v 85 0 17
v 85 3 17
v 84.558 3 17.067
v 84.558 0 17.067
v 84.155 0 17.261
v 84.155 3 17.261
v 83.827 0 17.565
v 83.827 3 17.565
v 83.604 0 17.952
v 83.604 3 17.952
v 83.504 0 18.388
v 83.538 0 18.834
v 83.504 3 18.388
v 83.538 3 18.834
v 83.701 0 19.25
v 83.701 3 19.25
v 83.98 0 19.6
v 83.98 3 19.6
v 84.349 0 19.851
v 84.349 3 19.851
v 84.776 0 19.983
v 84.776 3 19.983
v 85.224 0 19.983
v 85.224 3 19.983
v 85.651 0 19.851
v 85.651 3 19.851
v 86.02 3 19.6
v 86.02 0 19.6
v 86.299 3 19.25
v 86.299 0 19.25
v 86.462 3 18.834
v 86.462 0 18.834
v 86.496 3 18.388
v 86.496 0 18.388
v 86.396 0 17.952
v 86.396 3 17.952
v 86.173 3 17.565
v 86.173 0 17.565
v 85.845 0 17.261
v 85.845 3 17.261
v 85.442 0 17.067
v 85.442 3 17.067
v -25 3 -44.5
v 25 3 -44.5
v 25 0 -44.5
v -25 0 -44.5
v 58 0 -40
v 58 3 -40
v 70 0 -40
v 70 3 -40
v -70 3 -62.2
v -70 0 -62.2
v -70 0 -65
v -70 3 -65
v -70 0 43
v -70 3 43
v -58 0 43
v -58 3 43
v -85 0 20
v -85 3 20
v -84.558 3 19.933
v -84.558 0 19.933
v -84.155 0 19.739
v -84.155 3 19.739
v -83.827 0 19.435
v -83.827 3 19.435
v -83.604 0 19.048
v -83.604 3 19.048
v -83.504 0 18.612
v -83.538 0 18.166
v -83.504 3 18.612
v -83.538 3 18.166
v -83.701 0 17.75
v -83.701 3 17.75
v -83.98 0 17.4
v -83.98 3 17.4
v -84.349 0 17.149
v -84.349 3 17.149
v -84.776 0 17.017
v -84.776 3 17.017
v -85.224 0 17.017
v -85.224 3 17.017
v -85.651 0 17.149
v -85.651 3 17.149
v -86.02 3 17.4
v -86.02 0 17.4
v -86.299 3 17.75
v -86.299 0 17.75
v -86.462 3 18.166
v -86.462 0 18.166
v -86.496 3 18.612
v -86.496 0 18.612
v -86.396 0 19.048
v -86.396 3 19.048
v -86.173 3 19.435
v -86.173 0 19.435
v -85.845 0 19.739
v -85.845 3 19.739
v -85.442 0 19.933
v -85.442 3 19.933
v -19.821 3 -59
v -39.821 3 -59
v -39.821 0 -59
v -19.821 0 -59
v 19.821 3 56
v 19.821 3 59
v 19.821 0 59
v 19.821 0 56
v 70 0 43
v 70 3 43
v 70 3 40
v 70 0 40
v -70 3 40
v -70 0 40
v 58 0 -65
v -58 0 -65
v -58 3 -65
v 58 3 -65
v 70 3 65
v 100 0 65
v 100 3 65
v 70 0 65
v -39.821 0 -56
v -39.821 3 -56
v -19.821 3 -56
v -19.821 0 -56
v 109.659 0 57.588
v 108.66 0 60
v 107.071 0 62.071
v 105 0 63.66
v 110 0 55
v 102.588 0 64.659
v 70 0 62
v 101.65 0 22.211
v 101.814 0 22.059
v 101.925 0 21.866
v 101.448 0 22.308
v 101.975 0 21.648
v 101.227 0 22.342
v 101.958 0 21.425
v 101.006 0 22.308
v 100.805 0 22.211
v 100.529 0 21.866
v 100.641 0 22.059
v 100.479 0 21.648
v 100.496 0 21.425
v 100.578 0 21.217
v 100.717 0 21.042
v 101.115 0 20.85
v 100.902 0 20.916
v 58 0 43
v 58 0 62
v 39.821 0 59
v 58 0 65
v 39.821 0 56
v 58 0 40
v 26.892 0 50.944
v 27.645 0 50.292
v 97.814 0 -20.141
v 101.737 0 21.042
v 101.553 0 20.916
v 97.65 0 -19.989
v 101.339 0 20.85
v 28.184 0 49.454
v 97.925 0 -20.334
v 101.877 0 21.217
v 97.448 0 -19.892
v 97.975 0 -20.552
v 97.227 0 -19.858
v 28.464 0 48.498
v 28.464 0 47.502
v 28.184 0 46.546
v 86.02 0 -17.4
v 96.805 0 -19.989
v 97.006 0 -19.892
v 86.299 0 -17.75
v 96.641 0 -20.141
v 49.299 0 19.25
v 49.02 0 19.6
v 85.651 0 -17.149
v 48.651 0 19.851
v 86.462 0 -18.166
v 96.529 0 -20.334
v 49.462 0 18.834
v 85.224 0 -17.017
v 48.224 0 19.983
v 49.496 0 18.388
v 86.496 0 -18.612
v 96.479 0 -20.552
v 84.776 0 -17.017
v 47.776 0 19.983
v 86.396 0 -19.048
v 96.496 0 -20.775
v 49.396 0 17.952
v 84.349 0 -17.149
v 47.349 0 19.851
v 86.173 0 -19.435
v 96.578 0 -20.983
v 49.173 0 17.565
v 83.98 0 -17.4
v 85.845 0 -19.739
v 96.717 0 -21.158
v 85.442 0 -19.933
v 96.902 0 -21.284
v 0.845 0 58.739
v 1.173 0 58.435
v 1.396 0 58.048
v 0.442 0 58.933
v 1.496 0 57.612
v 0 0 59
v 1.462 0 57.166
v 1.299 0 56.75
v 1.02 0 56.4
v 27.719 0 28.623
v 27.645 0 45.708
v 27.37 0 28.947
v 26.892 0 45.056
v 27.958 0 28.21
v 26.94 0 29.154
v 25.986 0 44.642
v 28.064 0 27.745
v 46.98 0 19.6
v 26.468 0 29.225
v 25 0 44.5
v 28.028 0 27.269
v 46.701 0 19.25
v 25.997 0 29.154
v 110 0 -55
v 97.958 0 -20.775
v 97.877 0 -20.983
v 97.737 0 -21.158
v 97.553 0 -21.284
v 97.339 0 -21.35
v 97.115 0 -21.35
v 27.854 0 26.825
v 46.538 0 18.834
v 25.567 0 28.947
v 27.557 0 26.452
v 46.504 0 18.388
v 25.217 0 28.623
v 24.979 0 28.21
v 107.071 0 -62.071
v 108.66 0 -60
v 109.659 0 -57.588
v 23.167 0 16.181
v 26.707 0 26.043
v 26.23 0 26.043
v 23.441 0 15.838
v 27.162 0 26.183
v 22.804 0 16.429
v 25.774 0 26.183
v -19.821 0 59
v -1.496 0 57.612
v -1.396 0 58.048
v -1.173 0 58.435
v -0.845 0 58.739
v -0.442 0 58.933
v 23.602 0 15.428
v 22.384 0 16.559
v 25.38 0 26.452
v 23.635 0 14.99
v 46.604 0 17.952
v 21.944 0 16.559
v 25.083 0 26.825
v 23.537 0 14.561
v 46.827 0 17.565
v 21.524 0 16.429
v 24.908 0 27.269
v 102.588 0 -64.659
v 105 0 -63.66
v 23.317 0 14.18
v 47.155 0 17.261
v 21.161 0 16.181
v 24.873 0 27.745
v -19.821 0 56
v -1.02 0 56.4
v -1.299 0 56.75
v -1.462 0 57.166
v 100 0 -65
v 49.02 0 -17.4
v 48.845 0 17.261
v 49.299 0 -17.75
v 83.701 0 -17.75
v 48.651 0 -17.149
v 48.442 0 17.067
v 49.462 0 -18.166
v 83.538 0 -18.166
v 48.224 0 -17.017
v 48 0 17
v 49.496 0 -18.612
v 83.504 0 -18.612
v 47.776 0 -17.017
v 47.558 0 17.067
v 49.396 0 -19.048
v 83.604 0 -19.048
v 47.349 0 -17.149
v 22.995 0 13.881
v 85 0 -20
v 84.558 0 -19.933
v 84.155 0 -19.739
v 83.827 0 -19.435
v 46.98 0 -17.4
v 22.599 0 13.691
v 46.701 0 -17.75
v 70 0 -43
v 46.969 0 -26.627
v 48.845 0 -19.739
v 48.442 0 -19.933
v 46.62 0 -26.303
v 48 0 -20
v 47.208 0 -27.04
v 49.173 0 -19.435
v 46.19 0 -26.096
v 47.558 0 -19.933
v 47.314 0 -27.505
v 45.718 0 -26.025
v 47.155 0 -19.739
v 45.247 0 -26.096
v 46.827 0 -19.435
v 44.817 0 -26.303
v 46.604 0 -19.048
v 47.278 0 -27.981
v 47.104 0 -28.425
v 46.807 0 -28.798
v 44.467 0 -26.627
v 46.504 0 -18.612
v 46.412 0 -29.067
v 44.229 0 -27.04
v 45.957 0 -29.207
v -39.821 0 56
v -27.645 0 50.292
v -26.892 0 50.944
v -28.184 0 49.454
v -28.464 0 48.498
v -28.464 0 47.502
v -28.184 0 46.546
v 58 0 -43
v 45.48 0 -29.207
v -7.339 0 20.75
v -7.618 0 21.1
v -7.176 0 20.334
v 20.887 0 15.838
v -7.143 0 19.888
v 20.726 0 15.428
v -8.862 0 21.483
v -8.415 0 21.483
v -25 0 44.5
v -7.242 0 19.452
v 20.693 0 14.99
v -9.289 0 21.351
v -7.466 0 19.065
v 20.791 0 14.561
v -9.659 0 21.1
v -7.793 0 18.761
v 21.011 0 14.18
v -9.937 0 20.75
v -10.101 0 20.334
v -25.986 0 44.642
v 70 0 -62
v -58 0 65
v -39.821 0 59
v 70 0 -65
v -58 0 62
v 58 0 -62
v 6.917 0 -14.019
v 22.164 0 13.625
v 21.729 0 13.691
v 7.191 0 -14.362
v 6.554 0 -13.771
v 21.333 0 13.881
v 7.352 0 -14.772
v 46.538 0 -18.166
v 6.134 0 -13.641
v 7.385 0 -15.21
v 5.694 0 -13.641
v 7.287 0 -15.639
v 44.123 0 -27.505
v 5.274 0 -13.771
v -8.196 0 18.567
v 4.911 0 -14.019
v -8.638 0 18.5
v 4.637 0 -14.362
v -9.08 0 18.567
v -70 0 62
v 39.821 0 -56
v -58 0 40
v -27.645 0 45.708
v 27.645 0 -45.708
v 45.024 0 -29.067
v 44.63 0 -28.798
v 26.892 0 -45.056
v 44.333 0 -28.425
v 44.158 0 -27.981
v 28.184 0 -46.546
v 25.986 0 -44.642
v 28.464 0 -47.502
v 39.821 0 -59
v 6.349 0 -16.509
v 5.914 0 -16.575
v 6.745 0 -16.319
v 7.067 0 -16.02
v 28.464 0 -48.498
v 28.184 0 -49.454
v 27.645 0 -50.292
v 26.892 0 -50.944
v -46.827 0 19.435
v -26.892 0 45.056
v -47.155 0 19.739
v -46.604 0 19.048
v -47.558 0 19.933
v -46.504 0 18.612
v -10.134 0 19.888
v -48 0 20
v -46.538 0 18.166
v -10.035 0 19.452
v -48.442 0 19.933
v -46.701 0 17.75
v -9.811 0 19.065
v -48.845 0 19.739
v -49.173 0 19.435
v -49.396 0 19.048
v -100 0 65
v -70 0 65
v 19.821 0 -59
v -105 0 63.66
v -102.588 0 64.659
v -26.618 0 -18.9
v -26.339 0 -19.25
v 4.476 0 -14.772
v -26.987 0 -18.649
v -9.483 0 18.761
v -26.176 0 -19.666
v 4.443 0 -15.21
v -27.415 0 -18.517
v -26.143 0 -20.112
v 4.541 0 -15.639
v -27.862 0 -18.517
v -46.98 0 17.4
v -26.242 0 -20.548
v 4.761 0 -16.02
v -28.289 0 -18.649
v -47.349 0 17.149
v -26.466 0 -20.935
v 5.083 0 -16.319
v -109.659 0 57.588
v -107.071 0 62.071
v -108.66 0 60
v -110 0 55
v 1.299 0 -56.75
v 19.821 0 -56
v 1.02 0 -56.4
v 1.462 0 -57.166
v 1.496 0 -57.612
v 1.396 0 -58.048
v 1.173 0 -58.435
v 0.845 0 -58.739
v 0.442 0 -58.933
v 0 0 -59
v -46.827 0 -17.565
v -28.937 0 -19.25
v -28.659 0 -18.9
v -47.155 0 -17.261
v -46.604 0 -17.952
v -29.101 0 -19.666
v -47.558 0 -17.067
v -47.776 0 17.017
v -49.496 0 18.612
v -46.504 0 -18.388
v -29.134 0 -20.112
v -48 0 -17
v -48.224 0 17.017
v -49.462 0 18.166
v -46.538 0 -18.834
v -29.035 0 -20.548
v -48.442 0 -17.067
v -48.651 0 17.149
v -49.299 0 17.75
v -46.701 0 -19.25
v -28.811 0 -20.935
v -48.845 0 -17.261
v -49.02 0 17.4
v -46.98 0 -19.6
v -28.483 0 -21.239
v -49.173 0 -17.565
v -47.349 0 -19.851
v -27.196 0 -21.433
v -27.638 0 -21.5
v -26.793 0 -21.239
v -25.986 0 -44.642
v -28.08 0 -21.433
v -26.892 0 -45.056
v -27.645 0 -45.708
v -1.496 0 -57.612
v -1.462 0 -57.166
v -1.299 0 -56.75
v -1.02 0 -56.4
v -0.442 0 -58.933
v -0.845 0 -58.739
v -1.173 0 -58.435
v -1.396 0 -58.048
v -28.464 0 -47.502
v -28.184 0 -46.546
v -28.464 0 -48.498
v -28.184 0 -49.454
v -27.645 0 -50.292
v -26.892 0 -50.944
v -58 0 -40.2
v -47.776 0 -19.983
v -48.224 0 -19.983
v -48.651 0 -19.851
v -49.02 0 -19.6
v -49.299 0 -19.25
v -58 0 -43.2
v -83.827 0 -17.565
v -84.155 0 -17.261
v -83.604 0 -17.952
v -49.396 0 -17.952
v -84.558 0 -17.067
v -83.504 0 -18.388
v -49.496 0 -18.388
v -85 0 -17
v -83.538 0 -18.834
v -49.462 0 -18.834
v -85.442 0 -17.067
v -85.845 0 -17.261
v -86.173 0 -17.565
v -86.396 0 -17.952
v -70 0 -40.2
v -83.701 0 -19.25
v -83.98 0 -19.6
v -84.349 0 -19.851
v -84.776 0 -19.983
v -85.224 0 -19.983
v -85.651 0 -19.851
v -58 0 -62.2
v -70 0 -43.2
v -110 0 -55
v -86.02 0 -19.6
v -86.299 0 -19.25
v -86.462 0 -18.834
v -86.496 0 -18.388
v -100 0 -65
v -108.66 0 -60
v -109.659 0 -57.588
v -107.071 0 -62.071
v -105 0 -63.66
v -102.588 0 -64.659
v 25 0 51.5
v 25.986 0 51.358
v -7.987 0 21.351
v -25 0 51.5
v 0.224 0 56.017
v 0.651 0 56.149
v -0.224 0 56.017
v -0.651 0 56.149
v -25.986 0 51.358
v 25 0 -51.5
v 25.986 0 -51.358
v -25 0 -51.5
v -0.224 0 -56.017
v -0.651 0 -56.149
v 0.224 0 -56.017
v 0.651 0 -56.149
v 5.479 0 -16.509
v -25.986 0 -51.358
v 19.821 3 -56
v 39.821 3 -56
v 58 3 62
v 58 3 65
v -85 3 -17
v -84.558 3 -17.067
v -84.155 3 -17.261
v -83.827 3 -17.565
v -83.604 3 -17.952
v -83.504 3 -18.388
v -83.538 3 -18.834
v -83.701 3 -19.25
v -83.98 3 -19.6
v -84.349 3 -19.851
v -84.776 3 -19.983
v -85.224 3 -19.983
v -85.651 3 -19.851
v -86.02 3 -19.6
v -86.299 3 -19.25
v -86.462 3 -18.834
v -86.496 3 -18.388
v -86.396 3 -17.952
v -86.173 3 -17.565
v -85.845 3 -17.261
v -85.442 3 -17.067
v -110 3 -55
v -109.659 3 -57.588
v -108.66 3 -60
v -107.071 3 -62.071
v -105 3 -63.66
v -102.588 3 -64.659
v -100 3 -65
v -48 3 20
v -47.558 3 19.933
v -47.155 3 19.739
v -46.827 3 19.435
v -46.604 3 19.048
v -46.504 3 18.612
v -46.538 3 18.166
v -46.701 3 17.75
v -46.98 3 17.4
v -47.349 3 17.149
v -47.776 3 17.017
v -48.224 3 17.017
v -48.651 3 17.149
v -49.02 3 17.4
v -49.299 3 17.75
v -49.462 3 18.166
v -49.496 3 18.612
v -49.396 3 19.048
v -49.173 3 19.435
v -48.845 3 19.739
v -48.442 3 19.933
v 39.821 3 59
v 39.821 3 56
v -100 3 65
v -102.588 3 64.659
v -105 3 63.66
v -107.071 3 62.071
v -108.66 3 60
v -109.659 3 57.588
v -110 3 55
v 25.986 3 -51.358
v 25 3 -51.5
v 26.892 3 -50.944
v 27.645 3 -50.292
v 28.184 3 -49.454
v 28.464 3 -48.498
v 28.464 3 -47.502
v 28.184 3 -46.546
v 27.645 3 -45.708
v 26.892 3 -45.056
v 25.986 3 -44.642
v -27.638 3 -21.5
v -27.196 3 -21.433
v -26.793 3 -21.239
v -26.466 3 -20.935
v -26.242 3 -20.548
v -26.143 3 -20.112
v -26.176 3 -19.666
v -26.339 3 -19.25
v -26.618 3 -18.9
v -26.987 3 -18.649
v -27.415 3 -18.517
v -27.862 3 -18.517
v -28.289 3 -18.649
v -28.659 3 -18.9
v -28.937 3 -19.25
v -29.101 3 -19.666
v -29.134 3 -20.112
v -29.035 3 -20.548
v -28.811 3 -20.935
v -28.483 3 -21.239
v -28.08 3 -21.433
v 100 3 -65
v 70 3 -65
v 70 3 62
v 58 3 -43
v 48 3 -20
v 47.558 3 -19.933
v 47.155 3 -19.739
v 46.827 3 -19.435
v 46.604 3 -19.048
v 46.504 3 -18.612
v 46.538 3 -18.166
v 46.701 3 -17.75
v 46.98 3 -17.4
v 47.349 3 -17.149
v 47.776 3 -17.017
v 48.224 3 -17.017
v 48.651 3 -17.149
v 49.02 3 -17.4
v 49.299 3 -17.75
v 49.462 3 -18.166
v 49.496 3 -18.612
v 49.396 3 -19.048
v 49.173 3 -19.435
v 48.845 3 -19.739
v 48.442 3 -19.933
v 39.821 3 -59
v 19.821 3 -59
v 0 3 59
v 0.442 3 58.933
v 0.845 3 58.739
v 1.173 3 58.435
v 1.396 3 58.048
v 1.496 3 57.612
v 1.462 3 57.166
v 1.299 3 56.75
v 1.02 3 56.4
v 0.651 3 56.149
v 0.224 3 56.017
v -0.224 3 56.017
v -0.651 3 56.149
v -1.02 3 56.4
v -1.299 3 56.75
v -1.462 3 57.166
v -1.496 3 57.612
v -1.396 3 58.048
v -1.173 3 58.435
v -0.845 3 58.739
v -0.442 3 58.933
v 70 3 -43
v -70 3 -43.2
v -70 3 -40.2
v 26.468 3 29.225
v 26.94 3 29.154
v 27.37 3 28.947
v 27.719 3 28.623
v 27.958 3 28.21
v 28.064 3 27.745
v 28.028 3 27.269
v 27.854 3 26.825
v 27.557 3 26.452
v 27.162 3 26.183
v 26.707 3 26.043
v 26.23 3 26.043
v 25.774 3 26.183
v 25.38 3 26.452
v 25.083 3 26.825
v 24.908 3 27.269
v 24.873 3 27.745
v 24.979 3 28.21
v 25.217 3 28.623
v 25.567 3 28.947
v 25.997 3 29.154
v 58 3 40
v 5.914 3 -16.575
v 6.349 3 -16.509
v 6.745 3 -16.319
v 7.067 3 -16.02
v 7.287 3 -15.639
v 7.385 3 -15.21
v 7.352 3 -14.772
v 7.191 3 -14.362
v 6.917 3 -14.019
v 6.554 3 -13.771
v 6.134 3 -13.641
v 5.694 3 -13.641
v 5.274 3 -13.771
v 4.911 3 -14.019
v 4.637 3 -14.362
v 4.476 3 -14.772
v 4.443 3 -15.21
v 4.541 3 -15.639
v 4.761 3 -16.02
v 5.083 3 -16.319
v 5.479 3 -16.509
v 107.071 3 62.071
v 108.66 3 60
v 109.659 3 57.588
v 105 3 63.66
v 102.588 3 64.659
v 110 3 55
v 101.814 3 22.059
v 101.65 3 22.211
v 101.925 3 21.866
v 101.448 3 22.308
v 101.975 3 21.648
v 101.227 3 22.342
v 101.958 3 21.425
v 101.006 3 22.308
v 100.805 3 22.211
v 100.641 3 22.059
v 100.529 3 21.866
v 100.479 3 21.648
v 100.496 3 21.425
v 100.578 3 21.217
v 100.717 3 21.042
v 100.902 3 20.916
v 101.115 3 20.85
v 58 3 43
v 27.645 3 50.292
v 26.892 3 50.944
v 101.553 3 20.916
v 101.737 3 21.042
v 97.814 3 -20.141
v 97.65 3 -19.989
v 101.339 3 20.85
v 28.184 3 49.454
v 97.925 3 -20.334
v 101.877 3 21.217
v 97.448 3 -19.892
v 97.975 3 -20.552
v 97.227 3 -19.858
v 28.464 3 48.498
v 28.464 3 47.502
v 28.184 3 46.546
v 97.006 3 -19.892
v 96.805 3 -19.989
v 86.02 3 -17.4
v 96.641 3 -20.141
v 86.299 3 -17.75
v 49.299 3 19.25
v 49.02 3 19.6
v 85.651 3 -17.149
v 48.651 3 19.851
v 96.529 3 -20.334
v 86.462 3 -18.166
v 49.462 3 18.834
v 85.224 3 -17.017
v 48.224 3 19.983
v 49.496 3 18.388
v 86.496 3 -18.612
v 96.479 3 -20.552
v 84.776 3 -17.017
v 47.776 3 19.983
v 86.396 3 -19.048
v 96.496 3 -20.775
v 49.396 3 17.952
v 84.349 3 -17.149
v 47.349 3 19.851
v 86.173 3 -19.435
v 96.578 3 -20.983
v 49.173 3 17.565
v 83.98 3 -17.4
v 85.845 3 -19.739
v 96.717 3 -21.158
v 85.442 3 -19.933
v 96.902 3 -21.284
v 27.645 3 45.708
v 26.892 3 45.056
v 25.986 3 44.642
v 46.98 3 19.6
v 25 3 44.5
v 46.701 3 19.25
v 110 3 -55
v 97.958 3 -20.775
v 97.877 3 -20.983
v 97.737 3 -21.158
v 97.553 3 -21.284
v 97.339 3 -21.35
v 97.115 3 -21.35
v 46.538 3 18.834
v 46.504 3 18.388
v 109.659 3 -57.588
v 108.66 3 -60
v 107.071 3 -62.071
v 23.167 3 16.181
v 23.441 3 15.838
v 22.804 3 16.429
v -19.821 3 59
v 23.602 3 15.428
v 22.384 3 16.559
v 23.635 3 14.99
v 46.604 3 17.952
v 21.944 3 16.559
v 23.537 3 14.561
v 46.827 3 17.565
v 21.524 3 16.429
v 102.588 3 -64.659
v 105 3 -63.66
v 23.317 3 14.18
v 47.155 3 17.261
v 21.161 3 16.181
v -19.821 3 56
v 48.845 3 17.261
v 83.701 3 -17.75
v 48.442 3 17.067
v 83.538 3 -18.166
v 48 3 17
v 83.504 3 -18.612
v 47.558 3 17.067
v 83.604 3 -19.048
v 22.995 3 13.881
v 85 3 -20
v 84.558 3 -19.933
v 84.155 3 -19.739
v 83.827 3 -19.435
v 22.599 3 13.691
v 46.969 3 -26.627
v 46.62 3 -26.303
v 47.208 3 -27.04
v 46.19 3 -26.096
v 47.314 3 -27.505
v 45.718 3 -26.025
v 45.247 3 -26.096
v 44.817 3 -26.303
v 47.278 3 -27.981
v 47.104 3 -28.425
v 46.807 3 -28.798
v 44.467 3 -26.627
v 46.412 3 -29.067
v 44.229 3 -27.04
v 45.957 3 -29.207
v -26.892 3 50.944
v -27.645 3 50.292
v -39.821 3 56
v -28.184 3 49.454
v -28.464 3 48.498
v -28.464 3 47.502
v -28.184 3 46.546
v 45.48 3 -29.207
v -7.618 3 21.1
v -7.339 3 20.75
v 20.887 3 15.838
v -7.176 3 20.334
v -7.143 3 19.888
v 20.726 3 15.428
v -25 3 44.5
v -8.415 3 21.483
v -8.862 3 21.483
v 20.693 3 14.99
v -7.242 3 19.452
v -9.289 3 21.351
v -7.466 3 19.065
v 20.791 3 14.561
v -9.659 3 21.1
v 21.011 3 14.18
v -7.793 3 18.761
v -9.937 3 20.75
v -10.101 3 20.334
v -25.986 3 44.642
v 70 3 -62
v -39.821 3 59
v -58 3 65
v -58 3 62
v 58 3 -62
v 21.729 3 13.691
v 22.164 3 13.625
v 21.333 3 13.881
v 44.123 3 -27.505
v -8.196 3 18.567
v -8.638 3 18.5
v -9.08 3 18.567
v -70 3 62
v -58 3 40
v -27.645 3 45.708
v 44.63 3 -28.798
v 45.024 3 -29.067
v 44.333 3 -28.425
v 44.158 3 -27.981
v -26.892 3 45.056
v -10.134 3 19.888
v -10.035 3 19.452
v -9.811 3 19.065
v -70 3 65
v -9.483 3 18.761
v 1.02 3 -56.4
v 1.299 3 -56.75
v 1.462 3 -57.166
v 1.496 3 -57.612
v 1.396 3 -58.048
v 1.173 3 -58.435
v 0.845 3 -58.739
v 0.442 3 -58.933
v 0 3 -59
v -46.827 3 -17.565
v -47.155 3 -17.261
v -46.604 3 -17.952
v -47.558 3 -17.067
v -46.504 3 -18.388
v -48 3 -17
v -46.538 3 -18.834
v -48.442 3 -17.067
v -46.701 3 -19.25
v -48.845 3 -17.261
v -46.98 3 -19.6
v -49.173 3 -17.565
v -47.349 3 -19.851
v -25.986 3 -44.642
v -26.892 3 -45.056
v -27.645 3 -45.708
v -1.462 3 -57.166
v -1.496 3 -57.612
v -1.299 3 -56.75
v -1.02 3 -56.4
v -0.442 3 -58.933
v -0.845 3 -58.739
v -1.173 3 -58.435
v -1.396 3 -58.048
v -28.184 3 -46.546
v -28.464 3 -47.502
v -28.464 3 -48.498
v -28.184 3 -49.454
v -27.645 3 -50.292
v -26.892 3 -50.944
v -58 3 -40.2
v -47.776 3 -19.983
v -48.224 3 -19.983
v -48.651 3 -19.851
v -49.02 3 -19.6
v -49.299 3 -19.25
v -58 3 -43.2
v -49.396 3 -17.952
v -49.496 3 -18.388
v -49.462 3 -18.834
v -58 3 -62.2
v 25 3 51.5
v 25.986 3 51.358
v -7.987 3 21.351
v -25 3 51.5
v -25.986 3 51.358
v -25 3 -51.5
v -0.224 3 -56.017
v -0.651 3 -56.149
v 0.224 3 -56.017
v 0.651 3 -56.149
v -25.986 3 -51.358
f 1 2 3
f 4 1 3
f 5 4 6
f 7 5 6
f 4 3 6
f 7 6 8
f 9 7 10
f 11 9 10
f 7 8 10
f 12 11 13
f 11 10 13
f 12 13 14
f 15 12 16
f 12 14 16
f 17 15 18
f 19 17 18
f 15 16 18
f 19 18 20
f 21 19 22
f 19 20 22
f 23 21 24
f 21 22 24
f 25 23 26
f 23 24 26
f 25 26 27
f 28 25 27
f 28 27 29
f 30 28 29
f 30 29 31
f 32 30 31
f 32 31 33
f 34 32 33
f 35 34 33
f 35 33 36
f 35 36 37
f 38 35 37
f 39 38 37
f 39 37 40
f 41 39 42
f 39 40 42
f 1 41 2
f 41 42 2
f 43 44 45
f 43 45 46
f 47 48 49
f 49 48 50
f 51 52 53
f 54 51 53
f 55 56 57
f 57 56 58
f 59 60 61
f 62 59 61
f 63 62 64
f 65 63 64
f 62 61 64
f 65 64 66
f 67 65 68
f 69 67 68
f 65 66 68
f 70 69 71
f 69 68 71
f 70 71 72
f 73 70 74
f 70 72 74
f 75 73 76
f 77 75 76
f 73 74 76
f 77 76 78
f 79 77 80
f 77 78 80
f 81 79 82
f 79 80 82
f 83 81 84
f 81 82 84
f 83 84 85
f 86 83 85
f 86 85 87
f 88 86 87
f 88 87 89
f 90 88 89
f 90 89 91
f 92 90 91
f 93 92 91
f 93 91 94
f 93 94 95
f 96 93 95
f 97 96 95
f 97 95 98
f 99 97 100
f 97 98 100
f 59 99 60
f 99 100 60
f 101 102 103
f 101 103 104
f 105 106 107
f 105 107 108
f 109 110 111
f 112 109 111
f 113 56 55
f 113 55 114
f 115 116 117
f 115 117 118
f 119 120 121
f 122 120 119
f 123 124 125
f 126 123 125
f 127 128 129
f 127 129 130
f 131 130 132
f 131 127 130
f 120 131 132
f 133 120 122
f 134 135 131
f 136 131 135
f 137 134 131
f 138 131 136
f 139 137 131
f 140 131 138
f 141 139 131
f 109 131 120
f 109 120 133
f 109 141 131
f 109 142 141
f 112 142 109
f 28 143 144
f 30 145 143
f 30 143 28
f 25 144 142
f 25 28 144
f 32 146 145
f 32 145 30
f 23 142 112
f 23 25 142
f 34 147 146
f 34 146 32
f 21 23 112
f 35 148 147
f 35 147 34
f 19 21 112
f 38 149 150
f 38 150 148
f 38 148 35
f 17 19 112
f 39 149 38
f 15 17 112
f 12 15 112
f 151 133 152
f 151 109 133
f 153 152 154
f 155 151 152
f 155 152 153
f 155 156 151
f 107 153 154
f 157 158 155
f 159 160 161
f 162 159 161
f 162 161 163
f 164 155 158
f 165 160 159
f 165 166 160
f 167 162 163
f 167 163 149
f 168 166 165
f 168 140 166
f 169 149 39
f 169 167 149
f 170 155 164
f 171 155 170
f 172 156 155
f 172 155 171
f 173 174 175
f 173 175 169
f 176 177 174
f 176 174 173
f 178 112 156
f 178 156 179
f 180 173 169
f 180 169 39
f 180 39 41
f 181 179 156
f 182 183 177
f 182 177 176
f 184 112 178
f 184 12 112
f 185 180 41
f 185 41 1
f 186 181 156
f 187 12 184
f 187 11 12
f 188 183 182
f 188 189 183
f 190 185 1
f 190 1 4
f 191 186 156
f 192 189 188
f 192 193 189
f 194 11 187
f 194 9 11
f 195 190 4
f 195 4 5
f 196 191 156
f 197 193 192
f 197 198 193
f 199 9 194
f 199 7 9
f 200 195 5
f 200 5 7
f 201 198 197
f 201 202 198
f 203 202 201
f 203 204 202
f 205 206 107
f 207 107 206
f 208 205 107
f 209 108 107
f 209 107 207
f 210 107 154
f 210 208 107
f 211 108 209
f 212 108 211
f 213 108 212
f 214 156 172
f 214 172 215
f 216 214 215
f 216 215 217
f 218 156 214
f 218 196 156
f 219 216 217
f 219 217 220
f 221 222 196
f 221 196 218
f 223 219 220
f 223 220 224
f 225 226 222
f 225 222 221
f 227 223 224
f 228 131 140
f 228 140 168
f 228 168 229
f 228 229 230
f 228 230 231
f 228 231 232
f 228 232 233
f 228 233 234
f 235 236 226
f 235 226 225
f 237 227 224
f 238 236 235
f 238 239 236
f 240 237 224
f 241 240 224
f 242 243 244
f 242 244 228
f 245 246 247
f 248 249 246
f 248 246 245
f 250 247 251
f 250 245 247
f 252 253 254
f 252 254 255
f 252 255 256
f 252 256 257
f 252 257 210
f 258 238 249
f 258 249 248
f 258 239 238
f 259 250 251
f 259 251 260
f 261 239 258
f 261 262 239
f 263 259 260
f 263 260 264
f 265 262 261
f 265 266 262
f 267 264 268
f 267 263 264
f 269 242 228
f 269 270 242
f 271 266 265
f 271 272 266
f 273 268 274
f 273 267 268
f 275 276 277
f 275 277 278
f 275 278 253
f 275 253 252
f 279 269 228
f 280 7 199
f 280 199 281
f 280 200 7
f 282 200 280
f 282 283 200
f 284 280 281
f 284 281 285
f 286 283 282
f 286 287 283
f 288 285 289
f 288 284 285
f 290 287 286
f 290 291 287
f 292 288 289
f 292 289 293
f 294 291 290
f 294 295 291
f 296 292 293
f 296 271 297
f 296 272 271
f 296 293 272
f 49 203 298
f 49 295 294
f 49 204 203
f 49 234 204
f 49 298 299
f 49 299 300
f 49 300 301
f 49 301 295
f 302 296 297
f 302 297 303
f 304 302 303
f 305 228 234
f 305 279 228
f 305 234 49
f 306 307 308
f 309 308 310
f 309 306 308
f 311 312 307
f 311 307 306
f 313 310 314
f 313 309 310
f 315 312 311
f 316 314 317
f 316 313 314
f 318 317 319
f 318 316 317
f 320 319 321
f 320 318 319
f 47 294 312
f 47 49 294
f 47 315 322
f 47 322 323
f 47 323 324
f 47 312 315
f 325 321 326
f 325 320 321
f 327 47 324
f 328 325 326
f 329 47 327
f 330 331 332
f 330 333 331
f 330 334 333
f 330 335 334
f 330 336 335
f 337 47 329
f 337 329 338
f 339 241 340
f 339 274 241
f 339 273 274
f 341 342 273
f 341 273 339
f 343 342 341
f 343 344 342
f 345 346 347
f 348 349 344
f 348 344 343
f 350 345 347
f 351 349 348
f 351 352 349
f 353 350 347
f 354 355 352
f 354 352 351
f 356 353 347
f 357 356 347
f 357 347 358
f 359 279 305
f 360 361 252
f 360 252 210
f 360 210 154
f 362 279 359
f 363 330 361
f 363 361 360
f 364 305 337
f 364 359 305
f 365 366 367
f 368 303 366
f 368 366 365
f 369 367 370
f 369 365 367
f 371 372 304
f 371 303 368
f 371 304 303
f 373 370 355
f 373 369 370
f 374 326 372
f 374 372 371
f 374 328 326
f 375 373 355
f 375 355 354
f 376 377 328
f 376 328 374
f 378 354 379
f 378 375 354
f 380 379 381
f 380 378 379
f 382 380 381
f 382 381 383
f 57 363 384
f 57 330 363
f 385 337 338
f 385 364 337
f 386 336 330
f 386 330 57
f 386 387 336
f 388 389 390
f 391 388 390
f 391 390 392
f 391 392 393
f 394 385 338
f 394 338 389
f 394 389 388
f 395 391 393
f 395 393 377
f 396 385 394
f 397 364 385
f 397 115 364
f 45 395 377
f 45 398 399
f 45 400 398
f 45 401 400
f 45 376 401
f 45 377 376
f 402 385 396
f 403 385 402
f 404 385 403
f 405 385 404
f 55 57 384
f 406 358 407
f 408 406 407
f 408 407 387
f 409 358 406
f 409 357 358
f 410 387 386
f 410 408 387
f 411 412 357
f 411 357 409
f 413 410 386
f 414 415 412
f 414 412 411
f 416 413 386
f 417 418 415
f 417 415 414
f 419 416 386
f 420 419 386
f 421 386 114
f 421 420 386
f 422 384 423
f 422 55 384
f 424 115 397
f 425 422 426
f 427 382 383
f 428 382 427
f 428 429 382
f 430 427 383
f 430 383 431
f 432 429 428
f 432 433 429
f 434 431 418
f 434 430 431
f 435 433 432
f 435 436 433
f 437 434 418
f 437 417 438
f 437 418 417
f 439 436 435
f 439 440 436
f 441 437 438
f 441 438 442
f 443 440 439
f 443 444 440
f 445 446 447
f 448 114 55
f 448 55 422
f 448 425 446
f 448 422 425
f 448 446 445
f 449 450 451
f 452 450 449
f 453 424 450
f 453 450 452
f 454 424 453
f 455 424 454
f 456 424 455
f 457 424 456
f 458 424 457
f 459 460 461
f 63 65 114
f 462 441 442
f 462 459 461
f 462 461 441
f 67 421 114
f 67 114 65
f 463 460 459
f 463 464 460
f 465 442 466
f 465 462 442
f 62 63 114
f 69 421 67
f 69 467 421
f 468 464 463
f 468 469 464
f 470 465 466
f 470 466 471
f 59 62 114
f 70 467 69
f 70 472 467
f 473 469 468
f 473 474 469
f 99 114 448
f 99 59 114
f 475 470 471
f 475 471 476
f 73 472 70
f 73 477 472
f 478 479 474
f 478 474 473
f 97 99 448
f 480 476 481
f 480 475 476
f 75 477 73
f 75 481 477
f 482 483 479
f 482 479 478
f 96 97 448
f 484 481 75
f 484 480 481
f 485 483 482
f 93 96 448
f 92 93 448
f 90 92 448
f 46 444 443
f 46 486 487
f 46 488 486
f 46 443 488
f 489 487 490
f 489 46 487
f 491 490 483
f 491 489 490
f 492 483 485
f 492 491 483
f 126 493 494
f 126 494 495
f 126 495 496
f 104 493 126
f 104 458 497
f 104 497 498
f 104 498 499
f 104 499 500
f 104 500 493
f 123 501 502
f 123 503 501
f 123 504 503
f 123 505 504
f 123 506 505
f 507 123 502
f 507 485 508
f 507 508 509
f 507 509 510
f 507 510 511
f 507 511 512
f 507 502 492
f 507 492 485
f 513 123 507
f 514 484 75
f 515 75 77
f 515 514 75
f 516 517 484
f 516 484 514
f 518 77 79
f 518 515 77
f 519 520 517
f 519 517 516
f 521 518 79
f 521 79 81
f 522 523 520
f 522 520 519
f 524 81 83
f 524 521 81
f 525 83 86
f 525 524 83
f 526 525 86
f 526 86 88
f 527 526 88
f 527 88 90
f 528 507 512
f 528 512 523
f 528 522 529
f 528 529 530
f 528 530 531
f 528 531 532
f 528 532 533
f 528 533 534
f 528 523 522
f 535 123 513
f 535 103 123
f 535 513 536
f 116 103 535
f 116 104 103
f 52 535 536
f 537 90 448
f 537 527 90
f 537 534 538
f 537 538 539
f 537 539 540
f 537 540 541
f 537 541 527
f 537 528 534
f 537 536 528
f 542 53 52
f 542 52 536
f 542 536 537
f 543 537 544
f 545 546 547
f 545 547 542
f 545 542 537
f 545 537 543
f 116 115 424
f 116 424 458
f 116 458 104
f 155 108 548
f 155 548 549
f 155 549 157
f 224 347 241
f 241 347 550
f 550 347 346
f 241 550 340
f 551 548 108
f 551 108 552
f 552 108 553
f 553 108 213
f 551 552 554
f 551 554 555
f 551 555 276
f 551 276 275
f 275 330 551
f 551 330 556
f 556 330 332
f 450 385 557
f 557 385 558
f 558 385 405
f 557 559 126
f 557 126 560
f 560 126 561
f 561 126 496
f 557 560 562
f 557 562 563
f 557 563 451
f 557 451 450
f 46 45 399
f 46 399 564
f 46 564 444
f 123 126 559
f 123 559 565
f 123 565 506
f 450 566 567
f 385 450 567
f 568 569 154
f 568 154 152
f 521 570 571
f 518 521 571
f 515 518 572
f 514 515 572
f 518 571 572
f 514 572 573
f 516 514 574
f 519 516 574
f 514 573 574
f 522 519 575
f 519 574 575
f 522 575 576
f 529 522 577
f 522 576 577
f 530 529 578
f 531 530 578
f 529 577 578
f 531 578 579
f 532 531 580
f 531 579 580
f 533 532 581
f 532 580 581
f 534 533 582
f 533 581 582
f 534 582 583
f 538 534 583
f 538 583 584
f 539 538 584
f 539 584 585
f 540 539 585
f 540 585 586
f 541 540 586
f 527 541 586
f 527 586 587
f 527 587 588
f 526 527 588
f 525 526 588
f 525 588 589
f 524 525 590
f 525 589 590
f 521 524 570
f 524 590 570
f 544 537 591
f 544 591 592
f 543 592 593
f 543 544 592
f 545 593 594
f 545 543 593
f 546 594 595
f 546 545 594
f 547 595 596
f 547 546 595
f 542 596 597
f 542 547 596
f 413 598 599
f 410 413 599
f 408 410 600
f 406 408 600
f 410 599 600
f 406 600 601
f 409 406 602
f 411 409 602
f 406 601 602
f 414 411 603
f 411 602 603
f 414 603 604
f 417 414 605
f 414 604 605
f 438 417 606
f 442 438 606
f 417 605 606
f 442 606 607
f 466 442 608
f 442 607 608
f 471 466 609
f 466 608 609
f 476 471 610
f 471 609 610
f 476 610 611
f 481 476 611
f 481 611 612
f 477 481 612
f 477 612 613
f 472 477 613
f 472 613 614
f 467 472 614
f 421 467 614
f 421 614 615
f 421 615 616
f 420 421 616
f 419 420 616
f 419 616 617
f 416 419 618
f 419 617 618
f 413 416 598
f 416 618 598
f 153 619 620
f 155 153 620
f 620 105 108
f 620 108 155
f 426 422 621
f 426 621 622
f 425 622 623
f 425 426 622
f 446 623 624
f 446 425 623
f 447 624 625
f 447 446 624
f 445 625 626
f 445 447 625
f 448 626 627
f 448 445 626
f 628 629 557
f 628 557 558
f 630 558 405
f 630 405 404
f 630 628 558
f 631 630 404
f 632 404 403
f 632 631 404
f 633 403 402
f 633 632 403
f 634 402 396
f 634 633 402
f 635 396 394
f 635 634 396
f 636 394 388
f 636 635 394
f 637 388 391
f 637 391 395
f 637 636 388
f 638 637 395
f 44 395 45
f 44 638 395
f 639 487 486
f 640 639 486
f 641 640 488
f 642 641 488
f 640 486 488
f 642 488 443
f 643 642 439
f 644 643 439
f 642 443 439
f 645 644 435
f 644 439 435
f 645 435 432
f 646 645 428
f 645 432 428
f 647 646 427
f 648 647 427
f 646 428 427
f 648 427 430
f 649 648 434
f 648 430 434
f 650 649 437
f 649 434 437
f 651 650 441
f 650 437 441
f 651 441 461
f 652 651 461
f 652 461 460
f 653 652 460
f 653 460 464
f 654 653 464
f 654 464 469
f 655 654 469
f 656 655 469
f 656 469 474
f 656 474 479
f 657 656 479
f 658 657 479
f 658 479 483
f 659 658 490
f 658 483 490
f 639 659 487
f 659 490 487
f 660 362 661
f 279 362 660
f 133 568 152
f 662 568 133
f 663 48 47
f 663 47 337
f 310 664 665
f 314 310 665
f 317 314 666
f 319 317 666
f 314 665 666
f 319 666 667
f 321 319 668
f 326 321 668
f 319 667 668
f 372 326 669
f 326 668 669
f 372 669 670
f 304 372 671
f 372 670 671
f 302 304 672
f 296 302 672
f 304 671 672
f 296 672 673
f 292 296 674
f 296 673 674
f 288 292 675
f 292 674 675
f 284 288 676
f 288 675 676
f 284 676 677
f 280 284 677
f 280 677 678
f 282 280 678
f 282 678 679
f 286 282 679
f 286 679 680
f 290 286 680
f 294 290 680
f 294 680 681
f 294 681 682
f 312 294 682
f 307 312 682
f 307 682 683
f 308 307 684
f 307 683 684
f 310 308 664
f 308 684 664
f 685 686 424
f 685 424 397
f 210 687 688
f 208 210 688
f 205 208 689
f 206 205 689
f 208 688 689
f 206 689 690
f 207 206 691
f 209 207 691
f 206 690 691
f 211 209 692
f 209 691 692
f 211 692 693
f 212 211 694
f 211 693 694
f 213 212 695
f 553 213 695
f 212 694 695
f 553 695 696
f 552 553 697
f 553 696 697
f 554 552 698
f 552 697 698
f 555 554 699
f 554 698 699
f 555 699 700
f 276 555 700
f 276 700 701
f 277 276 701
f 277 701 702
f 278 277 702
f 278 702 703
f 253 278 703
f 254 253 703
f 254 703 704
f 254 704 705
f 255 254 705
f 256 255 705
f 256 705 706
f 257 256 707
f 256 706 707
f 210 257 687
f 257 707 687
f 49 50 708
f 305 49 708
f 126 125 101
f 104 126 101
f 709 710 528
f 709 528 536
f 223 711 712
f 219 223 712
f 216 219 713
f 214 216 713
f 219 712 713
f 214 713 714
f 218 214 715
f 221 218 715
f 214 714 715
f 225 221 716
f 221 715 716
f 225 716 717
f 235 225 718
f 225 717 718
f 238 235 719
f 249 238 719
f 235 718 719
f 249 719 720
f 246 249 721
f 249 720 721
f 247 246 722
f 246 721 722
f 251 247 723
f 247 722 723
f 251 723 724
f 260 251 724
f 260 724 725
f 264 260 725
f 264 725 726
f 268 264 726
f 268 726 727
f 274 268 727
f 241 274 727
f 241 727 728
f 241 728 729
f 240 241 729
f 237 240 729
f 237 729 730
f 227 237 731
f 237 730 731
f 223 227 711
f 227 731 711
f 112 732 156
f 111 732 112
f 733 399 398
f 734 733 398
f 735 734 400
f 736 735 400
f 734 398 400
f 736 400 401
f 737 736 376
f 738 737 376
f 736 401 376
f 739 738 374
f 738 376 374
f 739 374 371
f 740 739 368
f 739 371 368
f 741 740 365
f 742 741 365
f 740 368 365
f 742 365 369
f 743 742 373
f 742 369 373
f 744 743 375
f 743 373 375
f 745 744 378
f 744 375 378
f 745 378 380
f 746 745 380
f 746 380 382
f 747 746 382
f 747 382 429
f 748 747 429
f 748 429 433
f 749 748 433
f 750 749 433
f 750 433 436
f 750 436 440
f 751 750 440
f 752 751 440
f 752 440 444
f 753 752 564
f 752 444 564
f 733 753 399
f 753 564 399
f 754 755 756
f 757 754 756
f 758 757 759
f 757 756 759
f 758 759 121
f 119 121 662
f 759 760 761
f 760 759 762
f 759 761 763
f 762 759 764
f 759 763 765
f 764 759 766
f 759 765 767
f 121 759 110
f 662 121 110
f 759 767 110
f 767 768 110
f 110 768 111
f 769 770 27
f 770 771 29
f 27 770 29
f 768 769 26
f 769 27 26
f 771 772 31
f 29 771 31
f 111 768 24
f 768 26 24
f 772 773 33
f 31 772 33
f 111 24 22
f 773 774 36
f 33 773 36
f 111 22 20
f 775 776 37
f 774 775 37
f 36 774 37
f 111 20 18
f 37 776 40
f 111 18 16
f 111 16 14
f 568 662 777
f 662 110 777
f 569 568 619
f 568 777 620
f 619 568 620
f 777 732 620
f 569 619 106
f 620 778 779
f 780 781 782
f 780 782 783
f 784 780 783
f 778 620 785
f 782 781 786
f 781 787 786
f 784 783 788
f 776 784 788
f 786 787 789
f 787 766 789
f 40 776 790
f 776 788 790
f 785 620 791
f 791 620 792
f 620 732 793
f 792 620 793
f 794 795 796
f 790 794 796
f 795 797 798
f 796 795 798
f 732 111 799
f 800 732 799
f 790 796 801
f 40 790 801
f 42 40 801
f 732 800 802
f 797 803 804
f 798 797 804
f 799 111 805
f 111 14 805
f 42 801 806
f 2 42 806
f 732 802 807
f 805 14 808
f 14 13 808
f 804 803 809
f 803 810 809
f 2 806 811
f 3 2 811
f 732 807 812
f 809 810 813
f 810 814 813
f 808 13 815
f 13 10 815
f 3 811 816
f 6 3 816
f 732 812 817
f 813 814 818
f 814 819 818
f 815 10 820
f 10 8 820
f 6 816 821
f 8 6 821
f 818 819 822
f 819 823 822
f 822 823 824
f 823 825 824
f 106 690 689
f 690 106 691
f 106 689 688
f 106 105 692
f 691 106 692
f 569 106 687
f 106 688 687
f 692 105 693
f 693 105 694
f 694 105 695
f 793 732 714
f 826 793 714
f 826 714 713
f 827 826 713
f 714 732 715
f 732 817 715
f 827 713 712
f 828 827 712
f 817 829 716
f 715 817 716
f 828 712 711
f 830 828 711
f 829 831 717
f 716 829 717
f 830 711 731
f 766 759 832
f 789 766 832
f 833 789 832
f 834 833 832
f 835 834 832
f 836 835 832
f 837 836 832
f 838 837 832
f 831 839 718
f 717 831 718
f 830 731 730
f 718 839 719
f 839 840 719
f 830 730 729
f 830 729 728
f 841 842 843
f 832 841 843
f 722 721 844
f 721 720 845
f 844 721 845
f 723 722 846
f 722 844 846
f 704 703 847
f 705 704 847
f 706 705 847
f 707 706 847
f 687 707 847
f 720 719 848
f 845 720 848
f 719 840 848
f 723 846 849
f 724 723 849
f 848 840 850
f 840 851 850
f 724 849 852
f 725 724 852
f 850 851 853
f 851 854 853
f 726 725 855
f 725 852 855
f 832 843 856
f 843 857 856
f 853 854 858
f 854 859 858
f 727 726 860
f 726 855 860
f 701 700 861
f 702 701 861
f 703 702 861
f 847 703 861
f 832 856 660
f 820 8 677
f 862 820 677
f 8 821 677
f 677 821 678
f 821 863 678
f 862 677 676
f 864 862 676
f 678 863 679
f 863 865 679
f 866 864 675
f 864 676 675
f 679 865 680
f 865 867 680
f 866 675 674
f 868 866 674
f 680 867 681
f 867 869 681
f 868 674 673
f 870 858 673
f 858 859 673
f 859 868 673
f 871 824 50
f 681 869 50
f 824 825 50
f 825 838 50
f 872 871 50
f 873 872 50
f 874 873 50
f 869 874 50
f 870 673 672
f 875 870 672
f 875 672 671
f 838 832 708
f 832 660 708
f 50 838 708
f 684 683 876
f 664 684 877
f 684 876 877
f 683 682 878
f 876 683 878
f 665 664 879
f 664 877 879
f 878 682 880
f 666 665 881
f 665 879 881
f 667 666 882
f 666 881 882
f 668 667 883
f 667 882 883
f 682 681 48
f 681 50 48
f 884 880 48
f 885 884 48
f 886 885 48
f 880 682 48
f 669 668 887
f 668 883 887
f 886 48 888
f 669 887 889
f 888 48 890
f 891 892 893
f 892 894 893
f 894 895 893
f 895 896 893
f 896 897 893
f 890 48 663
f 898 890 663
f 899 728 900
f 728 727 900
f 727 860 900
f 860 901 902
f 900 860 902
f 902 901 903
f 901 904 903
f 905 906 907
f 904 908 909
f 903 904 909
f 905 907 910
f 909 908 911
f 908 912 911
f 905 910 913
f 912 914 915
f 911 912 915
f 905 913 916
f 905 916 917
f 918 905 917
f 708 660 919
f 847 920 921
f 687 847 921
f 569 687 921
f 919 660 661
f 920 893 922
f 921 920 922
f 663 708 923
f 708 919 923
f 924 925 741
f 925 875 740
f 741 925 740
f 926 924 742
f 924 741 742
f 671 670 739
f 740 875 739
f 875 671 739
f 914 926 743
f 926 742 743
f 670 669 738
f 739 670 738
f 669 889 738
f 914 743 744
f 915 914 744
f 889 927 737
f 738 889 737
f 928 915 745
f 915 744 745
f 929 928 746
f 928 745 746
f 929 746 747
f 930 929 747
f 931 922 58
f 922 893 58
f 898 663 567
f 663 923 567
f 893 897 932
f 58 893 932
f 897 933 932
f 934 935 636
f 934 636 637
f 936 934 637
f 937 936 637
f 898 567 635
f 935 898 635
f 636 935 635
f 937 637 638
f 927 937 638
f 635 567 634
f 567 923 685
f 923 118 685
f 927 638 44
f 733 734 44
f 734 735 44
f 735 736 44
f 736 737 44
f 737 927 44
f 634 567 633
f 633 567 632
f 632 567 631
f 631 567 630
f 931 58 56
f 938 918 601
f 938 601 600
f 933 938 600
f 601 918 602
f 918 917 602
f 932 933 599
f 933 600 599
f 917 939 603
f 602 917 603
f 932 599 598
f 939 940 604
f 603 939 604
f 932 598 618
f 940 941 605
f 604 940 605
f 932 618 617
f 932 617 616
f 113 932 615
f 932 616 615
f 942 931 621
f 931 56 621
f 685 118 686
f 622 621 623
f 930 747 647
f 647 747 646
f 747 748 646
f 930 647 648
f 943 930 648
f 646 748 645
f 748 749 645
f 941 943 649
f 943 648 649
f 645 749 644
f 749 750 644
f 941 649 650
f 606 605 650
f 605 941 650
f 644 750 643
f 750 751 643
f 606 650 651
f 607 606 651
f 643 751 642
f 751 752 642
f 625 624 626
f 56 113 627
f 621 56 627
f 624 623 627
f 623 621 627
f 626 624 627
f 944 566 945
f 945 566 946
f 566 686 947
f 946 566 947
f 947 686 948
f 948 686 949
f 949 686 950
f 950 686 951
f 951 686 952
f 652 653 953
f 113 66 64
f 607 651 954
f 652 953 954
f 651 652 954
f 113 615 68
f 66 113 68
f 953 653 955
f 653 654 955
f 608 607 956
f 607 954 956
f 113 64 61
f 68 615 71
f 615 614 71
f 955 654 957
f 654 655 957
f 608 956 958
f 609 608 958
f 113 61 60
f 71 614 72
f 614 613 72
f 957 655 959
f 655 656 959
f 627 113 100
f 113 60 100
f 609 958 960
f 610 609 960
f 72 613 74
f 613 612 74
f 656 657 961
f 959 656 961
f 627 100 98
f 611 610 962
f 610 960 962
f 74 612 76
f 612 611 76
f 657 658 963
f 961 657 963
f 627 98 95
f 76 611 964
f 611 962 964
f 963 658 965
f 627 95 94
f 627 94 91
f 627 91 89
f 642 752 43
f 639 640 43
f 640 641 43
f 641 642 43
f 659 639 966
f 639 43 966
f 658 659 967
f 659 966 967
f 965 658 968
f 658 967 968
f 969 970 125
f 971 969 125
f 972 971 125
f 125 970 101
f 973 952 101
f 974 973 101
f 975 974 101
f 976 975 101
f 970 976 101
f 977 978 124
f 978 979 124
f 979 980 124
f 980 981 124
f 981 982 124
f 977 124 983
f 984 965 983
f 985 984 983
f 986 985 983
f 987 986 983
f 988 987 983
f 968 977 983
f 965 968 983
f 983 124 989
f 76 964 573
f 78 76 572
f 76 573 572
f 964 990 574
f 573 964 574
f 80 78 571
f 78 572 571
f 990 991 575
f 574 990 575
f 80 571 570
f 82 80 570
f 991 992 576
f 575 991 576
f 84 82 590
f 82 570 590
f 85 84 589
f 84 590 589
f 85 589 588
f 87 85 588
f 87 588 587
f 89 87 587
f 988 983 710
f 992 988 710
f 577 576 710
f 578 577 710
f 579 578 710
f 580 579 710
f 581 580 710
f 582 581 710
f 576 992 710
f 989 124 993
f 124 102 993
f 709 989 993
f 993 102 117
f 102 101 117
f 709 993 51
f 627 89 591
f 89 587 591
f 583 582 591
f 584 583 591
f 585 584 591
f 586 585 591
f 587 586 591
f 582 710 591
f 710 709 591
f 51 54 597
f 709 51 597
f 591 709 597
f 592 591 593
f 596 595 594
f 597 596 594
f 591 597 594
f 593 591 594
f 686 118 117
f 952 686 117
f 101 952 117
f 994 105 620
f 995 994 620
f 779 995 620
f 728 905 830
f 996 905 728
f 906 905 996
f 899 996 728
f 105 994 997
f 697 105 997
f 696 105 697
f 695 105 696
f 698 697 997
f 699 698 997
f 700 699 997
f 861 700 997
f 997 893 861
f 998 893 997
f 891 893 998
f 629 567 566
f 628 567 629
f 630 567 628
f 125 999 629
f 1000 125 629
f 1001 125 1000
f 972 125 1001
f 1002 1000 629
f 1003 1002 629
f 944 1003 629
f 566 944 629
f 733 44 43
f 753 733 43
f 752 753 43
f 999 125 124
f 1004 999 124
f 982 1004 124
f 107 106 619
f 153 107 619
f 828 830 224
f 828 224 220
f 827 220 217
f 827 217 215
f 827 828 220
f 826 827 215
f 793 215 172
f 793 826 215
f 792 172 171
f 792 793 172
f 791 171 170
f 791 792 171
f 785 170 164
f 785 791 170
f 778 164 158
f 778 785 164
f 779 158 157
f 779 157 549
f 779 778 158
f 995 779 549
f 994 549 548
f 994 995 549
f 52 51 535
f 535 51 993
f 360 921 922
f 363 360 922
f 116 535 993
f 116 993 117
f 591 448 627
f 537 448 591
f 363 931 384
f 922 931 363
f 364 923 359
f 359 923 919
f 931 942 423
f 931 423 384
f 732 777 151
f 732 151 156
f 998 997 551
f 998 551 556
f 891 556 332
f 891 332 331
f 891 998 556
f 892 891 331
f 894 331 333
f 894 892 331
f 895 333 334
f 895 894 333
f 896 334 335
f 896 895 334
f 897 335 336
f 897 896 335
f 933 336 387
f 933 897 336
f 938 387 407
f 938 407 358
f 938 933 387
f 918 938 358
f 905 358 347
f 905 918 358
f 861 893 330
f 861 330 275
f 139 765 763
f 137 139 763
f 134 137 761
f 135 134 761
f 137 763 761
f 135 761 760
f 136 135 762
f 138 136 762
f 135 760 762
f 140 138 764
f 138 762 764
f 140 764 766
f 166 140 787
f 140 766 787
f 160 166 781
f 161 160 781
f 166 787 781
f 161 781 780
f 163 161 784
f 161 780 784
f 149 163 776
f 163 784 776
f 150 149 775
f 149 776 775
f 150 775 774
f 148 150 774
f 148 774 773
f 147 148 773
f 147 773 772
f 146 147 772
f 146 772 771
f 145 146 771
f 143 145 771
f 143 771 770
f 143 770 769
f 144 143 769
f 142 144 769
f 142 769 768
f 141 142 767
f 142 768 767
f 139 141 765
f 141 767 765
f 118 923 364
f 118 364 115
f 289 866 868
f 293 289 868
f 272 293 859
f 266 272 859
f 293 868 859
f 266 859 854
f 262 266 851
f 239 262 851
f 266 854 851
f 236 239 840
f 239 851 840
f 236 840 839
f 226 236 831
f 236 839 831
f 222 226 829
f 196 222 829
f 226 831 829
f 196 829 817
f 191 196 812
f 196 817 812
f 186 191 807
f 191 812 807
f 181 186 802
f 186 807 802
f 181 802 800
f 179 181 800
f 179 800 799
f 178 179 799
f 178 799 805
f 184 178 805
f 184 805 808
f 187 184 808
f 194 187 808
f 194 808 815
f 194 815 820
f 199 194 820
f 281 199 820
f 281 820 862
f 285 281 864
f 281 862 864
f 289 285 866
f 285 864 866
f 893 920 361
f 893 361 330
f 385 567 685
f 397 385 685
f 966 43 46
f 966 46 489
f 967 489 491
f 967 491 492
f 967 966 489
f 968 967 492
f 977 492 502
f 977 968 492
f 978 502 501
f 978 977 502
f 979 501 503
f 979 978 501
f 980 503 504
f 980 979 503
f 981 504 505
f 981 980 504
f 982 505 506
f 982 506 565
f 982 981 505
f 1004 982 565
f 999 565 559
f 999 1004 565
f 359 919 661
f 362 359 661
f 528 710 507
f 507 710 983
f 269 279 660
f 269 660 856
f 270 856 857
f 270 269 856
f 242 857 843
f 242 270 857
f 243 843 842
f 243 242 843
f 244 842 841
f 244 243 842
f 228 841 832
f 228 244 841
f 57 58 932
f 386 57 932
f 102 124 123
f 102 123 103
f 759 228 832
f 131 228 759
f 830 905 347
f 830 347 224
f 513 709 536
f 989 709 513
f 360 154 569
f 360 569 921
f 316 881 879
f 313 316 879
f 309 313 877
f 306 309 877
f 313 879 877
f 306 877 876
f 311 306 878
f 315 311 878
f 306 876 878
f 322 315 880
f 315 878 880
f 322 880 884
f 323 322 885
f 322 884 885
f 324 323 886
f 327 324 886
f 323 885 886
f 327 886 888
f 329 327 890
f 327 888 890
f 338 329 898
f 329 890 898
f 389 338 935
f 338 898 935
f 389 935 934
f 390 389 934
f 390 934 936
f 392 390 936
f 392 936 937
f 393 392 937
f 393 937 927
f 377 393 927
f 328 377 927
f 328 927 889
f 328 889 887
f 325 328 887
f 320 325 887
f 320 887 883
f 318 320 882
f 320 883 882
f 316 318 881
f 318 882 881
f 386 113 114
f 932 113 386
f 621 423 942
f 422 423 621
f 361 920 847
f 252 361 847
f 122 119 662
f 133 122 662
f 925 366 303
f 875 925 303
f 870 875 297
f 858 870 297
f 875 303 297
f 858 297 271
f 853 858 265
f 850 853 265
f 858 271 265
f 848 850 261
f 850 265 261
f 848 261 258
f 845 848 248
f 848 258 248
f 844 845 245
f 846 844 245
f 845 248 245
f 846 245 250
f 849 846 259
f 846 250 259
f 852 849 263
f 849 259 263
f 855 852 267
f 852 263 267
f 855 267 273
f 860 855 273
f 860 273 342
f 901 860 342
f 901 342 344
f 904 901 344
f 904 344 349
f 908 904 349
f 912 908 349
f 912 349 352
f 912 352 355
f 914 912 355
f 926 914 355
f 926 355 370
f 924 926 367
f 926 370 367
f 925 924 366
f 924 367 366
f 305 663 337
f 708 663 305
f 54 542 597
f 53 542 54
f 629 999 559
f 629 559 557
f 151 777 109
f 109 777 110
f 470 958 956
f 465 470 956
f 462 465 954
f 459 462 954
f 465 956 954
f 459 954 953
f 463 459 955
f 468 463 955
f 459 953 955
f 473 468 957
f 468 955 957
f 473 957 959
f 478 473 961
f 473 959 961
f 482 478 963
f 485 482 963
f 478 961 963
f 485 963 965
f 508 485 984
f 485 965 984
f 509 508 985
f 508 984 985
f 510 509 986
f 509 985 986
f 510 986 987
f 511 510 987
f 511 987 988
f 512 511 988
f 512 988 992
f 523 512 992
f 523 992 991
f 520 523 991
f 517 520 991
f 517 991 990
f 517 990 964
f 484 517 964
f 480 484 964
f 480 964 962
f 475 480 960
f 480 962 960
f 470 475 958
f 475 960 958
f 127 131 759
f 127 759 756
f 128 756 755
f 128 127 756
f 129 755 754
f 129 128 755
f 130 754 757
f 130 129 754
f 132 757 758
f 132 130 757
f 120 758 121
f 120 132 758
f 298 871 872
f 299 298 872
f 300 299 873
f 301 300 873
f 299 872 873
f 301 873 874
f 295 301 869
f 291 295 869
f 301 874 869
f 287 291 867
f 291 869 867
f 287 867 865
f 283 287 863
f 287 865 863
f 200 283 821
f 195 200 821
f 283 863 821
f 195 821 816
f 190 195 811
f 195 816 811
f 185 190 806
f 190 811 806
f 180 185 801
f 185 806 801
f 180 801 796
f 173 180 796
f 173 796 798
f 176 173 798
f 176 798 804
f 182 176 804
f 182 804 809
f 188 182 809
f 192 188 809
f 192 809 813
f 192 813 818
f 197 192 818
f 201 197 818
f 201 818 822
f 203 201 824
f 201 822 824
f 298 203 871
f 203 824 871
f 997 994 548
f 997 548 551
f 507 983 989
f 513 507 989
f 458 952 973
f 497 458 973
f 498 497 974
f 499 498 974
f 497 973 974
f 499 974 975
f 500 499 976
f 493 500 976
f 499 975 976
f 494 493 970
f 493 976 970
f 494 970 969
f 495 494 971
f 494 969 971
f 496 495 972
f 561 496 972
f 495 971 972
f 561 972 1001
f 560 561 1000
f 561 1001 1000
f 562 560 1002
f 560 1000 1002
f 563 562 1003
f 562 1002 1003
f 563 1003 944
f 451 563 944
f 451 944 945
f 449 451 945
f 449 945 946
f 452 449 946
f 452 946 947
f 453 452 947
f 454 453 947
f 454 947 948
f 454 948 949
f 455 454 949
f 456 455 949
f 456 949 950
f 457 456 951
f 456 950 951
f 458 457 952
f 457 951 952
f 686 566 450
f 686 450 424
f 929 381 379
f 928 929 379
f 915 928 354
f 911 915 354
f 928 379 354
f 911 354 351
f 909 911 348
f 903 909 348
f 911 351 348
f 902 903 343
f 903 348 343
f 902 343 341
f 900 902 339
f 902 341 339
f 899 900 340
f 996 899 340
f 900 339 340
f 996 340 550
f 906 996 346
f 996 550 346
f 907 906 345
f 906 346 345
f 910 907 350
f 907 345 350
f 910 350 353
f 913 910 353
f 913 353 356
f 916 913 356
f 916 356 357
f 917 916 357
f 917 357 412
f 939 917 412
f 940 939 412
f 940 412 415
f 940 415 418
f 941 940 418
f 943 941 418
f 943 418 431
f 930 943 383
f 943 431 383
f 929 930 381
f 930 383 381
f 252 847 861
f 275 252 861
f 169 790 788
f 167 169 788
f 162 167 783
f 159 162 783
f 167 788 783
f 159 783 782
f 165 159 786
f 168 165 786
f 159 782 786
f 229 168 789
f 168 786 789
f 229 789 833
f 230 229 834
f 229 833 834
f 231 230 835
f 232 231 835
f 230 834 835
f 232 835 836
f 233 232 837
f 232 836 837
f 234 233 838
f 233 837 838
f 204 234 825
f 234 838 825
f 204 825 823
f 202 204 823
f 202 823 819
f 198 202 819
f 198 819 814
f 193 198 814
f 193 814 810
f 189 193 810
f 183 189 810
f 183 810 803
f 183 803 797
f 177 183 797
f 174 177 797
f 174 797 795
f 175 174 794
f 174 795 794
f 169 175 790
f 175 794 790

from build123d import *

# Parameters (mm, degrees)
BOSS_EXTRUDE1_DEPTH = 3
SKETCH2_R           = 1.5
SKETCH2_W           = 12
SKETCH2_H           = 3
SKETCH2_H_2         = 2.8
SKETCH2_W_2         = 20
CUT_EXTRUDE1_DEPTH  = 3
SKETCH4_R           = 1.6
CUT_EXTRUDE3_DEPTH  = 3
SKETCH5_R           = 1.5
SKETCH5_R_2         = 1.475
CUT_EXTRUDE4_DEPTH  = 3
SKETCH6_R           = 0.75
CUT_EXTRUDE5_DEPTH  = 3
CUT_EXTRUDE6_DEPTH  = 3


with BuildPart() as part:
    # Sketch1 → Boss-Extrude1 (new body)
    with BuildSketch(Plane(origin=(0, 0, 0), x_dir=(1, 0, 0), z_dir=(0, 1, 0))):
        with BuildLine():
            Line((100, -65), (-100, -65))
            ThreePointArc((-100, -65), (-107.071067812, -62.071067812), (-110, -55))
            Line((-110, -55), (-110, 55))
            ThreePointArc((-110, 55), (-107.071067812, 62.071067812), (-100, 65))
            Line((-100, 65), (100, 65))
            ThreePointArc((100, 65), (107.071067812, 62.071067812), (110, 55))
            Line((110, 55), (110, -55))
            ThreePointArc((110, -55), (107.071067812, -62.071067812), (100, -65))
        make_face()
    extrude(amount=BOSS_EXTRUDE1_DEPTH)

    # Sketch2 → Cut-Extrude1 (cut)
    with BuildSketch(Plane(origin=(0, 3, 0), x_dir=(1, 0, 0), z_dir=(0, 1, 0))):
        with Locations(Location((-85, 18.5, 0), (0, 0, 270))):
            Circle(SKETCH2_R)
        with Locations(Location((-48, 18.5, 0), (0, 0, 270))):
            Circle(SKETCH2_R)
        with Locations(Location((-85, -18.5, 0), (0, 0, 270))):
            Circle(SKETCH2_R)
        with Locations(Location((-48, -18.5, 0), (0, 0, 270))):
            Circle(SKETCH2_R)
        with Locations(Location((48, -18.5, 0), (0, 0, 90))):
            Circle(SKETCH2_R)
        with Locations(Location((85, -18.5, 0), (0, 0, 90))):
            Circle(SKETCH2_R)
        with Locations(Location((48, 18.5, 0), (0, 0, 90))):
            Circle(SKETCH2_R)
        with Locations(Location((85, 18.5, 0), (0, 0, 90))):
            Circle(SKETCH2_R)
        with Locations(Location((0, -57.5, 0), (0, 0, 270))):
            Circle(SKETCH2_R)
        with Locations(Location((0, 57.5, 0), (0, 0, 90))):
            Circle(SKETCH2_R)
        with Locations((64, -63.5)):
            Rectangle(SKETCH2_W, SKETCH2_H)
        with Locations((64, 63.5)):
            Rectangle(SKETCH2_W, SKETCH2_H)
        with Locations((-64, -63.5)):
            Rectangle(SKETCH2_W, SKETCH2_H)
        with Locations((-64, 63.6)):
            Rectangle(SKETCH2_W, SKETCH2_H_2)
        with Locations((-64, 41.7)):
            Rectangle(SKETCH2_W, SKETCH2_H)
        with Locations((64, 41.5)):
            Rectangle(SKETCH2_W, SKETCH2_H)
        with Locations((64, -41.5)):
            Rectangle(SKETCH2_W, SKETCH2_H)
        with Locations((-64, -41.5)):
            Rectangle(SKETCH2_W, SKETCH2_H)
        with Locations((29.820667629, -57.5)):
            Rectangle(SKETCH2_W_2, SKETCH2_H)
        with Locations((-29.820667629, -57.5)):
            Rectangle(SKETCH2_W_2, SKETCH2_H)
        with Locations((-29.820667629, 57.5)):
            Rectangle(SKETCH2_W_2, SKETCH2_H)
        with Locations((29.820667629, 57.5)):
            Rectangle(SKETCH2_W_2, SKETCH2_H)
    extrude(amount=-CUT_EXTRUDE1_DEPTH, mode=Mode.SUBTRACT)

    # Sketch4 → Cut-Extrude3 (cut)
    with BuildSketch(Plane(origin=(0, 3, 0), x_dir=(1, 0, 0), z_dir=(0, 1, 0))):
        with Locations(Location((26.468228909, -27.625, 0), (0, 0, 270))):
            Circle(SKETCH4_R)
        with Locations(Location((45.718228909, 27.625, 0), (0, 0, 270))):
            Circle(SKETCH4_R)
    extrude(amount=-CUT_EXTRUDE3_DEPTH, mode=Mode.SUBTRACT)

    # Sketch5 → Cut-Extrude4 (cut)
    with BuildSketch(Plane.XZ):
        with Locations(Location((-27.638314588, -20, 0), (0, 0, 270))):
            Circle(SKETCH5_R)
        with Locations(Location((-8.638314588, 20, 0), (0, 0, 270))):
            Circle(SKETCH5_R)
        with Locations(Location((22.163922177, 15.1, 0), (0, 0, 270))):
            Circle(SKETCH5_R_2)
        with Locations(Location((5.913922177, -15.1, 0), (0, 0, 270))):
            Circle(SKETCH5_R_2)
    extrude(amount=-CUT_EXTRUDE4_DEPTH, mode=Mode.SUBTRACT)

    # Sketch6 → Cut-Extrude5 (cut)
    with BuildSketch(Plane(origin=(0, 3, 0), x_dir=(1, 0, 0), z_dir=(0, 1, 0))):
        with Locations(Location((101.22716255, -21.591786593, 0), (0, 0, 270))):
            Circle(SKETCH6_R)
        with Locations(Location((97.22716255, 20.608213407, 0), (0, 0, 270))):
            Circle(SKETCH6_R)
    extrude(amount=-CUT_EXTRUDE5_DEPTH, mode=Mode.SUBTRACT)

    # Sketch7 → Cut-Extrude6 (cut)
    with BuildSketch(Plane(origin=(0, 3, 0), x_dir=(1, 0, 0), z_dir=(0, 1, 0))):
        with BuildLine():
            Line((-25, -44.5), (25, -44.5))
            ThreePointArc((25, -44.5), (28.5, -48), (25, -51.5))
            Line((25, -51.5), (-25, -51.5))
            ThreePointArc((-25, -51.5), (-28.5, -48), (-25, -44.5))
        make_face()
        with BuildLine():
            Line((-25, 51.5), (25, 51.5))
            ThreePointArc((25, 51.5), (28.5, 48), (25, 44.5))
            Line((25, 44.5), (-25, 44.5))
            ThreePointArc((-25, 44.5), (-28.5, 48), (-25, 51.5))
        make_face()
    extrude(amount=-CUT_EXTRUDE6_DEPTH, mode=Mode.SUBTRACT)


solid = part.part
